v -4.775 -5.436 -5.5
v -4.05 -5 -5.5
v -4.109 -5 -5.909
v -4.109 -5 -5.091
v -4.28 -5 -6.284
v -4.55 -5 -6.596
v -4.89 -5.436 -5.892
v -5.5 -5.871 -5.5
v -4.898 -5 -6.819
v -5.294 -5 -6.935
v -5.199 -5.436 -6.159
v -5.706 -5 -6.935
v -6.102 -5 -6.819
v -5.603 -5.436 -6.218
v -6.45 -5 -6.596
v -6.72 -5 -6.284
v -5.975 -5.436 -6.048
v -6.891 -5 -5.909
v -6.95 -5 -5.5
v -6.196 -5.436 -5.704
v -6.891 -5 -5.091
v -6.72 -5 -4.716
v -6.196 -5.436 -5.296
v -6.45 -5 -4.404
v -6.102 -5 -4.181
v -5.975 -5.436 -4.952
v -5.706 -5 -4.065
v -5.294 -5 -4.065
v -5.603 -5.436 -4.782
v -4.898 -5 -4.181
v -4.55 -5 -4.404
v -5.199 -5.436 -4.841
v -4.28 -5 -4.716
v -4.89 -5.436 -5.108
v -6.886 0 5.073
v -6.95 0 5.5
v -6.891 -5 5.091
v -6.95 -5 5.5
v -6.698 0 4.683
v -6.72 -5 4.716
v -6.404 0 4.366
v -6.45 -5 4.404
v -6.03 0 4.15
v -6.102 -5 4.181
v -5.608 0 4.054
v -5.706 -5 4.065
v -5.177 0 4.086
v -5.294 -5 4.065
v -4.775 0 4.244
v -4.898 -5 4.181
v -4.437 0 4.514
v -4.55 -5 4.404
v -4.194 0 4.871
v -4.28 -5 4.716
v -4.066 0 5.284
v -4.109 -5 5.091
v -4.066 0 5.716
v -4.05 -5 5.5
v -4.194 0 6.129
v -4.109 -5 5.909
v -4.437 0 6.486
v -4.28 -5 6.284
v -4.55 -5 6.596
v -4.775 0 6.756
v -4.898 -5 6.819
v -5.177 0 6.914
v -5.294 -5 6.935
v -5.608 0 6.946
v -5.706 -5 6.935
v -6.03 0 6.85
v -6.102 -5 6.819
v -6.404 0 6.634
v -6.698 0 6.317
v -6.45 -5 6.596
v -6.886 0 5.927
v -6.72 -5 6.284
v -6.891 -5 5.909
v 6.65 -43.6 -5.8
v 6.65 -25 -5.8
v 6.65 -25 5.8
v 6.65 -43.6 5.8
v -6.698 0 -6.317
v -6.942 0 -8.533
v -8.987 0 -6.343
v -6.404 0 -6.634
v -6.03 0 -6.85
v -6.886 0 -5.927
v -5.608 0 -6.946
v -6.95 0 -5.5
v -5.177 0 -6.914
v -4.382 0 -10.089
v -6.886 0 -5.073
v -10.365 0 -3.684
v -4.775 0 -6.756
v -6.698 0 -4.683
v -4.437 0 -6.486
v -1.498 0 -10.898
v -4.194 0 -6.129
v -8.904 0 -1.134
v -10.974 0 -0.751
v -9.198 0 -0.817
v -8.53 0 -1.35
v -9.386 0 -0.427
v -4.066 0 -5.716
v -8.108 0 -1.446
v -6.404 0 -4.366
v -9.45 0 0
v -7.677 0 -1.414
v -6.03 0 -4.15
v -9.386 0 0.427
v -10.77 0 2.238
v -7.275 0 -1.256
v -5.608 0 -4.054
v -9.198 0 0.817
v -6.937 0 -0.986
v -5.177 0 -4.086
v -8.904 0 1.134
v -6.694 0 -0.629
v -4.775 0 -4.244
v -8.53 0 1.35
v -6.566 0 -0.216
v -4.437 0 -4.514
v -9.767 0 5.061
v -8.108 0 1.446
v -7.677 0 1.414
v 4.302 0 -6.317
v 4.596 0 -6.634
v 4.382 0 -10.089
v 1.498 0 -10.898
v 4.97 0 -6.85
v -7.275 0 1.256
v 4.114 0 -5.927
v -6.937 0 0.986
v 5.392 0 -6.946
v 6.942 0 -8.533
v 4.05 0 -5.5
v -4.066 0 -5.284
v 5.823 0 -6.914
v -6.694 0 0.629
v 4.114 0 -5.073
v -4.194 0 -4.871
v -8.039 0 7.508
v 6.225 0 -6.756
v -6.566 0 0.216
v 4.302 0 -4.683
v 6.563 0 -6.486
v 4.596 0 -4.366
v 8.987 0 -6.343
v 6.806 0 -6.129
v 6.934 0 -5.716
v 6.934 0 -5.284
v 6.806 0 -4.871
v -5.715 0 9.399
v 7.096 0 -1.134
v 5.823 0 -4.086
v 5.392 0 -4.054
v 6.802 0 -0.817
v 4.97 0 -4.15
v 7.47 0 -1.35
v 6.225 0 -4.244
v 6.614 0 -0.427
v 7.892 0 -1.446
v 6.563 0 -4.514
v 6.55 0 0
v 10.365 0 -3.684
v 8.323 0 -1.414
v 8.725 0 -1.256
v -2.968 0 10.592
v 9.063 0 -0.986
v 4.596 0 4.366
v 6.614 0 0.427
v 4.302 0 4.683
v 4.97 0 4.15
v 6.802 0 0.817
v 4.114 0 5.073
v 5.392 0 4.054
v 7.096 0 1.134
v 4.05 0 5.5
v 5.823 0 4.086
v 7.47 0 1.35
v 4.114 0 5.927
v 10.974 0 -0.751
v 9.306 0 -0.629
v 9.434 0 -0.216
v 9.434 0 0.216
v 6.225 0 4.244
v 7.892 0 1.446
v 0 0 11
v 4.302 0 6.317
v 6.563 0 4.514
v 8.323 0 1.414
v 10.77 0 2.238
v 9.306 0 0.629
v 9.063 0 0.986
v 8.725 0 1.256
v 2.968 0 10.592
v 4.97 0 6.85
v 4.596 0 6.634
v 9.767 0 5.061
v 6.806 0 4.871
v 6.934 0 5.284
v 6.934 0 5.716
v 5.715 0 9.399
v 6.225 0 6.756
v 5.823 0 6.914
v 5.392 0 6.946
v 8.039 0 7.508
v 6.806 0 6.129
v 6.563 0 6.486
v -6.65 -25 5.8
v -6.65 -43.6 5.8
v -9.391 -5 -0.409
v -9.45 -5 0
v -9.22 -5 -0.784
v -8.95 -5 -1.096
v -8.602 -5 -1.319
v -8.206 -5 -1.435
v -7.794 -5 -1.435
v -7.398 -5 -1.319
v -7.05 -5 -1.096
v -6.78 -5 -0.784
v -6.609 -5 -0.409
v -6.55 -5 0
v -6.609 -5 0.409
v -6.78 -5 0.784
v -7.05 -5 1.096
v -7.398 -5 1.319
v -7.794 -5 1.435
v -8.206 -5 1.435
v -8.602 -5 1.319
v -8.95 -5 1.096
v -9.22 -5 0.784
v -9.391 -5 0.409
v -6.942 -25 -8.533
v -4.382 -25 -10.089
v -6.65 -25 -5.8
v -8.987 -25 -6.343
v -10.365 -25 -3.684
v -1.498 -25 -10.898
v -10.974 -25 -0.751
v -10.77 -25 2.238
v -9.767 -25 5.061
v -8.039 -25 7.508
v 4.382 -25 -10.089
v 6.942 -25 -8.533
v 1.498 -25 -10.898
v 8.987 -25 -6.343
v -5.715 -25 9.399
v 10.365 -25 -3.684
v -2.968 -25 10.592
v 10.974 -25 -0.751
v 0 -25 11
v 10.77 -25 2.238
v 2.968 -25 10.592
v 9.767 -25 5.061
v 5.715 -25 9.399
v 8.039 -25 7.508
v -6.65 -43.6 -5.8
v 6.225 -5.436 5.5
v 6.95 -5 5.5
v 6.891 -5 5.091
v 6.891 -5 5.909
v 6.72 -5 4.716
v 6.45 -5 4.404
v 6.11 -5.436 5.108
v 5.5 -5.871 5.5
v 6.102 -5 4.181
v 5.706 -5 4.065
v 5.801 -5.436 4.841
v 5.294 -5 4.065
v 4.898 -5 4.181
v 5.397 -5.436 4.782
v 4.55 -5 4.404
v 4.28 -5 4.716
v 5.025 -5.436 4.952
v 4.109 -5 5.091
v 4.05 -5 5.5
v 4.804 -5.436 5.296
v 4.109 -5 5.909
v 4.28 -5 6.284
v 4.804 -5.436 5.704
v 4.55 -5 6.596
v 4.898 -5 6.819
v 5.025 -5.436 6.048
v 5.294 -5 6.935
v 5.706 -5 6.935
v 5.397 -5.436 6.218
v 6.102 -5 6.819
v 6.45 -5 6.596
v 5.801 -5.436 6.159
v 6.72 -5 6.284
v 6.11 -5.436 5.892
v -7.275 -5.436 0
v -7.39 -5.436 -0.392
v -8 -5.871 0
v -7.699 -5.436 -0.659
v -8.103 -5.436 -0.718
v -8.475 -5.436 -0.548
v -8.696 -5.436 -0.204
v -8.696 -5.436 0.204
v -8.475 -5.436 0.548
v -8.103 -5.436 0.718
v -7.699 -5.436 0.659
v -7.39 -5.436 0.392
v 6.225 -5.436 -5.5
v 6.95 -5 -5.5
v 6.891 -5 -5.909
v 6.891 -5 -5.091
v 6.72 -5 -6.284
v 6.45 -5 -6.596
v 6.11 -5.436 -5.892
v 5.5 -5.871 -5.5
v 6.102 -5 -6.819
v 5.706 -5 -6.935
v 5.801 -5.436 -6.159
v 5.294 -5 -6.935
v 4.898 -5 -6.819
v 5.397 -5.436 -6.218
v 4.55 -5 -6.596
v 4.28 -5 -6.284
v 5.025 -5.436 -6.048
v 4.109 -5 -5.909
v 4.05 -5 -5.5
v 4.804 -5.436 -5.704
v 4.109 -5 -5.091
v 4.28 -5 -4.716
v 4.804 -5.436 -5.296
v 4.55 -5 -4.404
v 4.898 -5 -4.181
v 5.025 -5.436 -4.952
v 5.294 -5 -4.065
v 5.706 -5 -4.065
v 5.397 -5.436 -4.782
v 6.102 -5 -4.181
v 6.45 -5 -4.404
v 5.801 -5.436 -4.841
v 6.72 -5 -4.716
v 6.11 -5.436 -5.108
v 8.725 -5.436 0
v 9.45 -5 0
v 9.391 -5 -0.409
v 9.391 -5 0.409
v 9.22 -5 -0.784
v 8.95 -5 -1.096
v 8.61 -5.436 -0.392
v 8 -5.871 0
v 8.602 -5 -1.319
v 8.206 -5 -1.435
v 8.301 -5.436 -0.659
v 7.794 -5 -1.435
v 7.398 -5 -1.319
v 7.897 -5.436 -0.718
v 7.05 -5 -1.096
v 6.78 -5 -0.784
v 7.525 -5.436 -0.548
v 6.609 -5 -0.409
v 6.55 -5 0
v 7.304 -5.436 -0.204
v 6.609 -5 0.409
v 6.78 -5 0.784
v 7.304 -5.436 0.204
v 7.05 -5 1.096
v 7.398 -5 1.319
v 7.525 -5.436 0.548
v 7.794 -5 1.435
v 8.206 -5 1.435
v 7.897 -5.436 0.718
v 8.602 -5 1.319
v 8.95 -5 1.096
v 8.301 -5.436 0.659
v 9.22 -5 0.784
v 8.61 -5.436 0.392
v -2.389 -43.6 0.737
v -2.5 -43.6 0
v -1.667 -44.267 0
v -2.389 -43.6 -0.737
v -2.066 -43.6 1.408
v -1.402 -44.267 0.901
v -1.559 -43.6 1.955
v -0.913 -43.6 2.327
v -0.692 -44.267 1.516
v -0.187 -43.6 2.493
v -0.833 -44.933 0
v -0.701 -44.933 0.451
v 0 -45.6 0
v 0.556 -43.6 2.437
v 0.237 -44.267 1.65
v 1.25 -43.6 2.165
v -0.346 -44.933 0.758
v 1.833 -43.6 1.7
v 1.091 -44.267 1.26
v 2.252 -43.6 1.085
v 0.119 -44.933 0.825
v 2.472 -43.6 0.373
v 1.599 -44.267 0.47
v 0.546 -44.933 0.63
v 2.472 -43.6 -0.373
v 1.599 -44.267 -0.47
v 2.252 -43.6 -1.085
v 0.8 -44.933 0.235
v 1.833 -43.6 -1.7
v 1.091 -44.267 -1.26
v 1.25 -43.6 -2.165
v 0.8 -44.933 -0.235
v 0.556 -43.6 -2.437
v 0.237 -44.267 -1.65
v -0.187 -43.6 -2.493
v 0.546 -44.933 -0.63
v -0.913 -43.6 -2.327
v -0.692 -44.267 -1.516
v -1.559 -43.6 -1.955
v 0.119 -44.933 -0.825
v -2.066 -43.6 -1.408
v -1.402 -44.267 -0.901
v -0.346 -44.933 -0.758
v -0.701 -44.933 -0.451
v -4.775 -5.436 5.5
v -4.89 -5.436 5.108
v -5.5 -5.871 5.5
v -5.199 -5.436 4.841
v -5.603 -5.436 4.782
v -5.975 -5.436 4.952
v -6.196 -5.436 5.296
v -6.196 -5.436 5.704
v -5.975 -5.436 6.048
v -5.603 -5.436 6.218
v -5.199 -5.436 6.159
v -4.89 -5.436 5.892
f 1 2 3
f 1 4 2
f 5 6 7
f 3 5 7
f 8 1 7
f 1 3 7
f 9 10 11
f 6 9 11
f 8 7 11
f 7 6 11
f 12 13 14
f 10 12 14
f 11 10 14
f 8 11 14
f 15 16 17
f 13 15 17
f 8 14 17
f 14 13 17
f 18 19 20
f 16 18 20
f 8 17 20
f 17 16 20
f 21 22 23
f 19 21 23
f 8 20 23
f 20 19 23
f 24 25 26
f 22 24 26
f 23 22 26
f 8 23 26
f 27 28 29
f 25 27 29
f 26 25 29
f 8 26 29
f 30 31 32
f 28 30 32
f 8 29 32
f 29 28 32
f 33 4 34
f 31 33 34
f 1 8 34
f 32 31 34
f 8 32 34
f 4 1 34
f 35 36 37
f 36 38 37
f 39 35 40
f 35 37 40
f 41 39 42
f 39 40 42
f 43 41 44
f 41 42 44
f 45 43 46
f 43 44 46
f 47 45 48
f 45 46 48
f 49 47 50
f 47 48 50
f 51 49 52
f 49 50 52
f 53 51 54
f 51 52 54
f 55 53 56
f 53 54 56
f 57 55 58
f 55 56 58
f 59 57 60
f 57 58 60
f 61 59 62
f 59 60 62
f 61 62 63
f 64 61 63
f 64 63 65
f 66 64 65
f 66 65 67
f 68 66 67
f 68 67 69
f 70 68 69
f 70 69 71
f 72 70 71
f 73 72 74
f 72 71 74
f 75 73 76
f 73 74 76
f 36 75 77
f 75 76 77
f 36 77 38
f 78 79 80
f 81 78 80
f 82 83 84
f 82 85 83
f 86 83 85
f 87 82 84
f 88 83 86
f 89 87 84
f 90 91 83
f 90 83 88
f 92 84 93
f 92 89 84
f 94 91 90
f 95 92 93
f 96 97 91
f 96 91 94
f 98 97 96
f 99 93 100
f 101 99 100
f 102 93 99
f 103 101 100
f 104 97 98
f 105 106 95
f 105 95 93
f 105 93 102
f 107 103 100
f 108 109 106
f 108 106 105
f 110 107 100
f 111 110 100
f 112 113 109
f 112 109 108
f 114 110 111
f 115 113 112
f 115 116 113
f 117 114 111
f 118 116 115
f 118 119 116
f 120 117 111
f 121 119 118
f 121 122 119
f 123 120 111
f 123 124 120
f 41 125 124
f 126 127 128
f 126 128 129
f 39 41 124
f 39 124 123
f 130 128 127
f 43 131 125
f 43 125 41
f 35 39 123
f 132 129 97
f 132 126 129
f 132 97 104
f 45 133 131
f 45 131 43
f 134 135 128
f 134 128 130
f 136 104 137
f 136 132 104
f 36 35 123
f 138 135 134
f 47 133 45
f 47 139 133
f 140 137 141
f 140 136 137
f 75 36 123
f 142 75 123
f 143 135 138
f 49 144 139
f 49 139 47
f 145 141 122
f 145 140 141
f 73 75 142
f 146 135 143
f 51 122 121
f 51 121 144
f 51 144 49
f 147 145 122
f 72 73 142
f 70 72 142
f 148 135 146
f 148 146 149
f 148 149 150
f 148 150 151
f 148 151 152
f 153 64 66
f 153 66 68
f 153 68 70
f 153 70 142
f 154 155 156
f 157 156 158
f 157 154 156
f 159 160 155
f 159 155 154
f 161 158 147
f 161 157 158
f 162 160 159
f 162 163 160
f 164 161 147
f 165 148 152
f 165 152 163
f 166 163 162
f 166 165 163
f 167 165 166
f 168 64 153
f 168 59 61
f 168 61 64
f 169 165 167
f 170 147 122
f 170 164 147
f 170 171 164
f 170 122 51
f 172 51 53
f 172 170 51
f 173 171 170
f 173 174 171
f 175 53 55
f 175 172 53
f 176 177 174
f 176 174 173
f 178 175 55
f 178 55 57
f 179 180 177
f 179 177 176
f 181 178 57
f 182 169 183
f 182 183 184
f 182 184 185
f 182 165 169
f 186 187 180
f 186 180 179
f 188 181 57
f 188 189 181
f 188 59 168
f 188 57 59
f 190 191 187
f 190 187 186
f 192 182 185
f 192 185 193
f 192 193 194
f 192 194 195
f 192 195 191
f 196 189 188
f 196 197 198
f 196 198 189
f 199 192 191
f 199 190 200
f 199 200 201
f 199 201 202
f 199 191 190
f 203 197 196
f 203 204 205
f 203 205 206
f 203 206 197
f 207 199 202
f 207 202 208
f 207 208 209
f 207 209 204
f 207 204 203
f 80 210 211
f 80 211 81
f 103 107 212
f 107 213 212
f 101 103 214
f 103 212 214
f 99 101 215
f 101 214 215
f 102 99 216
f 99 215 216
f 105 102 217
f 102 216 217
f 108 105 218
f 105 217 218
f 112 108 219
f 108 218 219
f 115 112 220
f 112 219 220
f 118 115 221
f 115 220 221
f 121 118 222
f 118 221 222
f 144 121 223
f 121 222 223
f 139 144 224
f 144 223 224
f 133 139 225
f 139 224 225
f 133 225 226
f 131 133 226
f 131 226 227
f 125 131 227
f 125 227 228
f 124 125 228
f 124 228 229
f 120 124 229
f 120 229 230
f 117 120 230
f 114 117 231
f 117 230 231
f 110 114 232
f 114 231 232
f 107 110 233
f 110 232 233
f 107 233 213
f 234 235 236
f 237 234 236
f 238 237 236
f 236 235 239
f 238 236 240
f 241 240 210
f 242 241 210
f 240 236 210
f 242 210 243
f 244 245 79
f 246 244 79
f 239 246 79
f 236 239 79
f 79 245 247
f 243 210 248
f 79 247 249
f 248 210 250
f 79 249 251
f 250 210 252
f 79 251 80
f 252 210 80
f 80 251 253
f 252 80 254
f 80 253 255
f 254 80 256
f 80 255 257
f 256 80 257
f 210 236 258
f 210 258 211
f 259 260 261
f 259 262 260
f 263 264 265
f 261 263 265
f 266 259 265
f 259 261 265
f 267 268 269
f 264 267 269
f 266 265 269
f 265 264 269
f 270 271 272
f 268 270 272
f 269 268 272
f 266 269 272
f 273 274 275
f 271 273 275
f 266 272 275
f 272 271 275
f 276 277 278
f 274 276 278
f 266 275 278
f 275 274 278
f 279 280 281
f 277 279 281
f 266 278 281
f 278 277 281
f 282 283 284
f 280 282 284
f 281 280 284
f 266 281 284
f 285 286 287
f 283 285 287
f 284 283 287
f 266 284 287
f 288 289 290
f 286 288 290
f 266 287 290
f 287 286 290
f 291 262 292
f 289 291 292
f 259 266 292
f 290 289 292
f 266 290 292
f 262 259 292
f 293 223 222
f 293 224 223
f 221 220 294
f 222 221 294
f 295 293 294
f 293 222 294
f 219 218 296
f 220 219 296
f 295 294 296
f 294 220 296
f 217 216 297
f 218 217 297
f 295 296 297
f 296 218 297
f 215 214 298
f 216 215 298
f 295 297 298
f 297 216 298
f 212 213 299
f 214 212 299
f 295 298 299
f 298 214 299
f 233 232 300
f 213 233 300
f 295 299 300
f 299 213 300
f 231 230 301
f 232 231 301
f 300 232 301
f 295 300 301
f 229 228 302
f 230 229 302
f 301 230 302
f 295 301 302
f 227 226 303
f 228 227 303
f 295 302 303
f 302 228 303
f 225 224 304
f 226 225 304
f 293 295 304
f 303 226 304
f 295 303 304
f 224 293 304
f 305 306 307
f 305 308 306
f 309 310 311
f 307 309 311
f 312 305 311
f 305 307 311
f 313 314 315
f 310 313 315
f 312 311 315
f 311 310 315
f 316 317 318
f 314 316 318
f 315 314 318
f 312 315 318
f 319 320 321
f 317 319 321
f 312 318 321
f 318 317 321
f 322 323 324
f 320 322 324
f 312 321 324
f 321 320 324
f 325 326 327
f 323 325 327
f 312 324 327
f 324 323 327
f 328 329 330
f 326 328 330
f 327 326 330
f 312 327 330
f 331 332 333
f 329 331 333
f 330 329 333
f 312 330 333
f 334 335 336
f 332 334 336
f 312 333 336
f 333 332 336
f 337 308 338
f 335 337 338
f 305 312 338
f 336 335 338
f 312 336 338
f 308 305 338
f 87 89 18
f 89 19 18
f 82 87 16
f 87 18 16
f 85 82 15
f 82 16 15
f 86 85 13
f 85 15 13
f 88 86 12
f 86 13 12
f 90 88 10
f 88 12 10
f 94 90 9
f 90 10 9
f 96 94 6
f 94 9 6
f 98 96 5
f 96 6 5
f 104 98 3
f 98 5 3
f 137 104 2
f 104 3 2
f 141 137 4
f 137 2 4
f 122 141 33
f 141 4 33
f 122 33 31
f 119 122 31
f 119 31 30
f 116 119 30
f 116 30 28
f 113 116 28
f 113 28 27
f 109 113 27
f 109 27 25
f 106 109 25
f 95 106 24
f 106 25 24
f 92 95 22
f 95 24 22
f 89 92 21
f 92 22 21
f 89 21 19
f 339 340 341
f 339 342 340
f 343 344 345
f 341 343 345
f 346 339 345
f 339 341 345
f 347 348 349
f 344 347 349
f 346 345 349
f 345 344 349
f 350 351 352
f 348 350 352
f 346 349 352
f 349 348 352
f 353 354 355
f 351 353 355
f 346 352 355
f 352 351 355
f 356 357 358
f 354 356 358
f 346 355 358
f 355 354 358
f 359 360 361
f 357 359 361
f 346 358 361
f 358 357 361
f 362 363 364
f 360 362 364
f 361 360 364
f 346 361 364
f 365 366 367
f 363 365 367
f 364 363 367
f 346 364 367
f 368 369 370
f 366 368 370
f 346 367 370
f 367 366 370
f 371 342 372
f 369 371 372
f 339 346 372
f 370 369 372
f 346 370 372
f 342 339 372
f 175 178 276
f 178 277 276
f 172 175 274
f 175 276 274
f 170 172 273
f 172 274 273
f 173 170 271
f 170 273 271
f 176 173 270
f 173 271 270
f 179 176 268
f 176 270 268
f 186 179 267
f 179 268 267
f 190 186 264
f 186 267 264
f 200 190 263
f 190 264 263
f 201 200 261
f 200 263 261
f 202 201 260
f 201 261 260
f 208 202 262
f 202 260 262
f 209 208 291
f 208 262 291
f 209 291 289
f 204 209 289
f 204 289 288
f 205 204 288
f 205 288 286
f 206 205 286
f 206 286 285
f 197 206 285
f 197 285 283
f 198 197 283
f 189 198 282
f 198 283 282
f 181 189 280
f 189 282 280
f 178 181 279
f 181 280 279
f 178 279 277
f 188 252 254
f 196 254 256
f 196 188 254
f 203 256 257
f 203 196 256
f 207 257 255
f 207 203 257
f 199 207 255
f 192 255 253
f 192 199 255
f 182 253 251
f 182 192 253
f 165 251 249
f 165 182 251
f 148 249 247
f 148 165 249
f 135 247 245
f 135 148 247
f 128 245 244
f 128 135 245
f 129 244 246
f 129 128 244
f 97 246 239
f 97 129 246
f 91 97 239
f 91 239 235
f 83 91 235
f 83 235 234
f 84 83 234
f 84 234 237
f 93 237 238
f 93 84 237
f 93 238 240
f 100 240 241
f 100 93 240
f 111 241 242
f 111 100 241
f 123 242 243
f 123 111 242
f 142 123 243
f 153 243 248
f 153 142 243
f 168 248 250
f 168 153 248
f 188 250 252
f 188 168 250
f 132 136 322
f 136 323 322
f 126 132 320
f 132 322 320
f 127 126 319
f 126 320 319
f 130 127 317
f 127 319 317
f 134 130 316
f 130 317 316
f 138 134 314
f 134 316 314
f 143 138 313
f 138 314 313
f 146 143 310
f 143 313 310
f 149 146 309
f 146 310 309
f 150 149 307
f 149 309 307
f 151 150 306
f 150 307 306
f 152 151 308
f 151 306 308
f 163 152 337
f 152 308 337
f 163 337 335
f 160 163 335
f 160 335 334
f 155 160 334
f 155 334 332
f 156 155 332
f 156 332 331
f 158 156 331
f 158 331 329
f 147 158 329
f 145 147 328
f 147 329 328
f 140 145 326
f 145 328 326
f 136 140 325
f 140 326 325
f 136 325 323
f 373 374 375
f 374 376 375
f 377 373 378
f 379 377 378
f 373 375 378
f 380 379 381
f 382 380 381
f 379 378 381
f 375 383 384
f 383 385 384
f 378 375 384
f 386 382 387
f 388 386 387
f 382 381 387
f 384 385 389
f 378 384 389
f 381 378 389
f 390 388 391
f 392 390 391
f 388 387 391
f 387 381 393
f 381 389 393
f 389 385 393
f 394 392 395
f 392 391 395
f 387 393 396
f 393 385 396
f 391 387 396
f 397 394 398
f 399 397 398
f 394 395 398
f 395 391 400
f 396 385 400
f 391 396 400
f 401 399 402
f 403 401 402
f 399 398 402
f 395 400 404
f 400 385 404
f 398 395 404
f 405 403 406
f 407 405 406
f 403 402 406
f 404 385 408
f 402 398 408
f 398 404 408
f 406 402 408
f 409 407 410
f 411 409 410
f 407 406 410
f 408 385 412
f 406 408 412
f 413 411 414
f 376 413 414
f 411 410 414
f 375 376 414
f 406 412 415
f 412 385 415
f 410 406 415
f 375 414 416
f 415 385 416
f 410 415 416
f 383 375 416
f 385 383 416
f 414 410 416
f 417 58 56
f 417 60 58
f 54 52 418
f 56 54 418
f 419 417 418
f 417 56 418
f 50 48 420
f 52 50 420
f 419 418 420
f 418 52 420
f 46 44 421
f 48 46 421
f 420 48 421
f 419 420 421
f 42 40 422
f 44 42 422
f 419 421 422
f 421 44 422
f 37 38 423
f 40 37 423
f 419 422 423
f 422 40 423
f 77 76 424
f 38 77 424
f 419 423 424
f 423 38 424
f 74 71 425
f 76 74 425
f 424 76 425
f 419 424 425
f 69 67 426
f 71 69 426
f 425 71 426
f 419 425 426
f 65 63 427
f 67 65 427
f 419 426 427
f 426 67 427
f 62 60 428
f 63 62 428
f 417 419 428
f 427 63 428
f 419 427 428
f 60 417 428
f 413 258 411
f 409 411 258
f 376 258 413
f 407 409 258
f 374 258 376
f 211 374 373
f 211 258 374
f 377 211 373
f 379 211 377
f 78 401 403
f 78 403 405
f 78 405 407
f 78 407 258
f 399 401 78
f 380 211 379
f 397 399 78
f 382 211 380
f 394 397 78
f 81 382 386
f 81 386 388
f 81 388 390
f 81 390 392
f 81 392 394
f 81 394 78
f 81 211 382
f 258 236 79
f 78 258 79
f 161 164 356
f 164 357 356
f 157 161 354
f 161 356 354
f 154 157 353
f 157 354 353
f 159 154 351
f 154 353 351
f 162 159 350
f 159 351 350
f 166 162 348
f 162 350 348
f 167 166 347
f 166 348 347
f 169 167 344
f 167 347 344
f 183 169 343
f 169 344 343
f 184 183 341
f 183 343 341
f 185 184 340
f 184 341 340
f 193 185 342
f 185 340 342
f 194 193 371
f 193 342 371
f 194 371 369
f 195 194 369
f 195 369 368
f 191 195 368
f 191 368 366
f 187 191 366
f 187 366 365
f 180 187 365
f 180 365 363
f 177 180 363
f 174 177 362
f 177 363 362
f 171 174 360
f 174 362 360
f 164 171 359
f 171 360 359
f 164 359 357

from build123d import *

# Parameters (mm, degrees)
SKETCH2_R                  = 11
BOSS_EXTRUDE1_DEPTH        = 25
SKETCH3_W                  = 13.3
SKETCH3_H                  = 11.6
BOSS_EXTRUDE2_DEPTH        = 18.6
M2_5_CLEARANCE_HOLE1_D     = 2.9
M2_5_CLEARANCE_HOLE1_DEPTH = 5
M2_5_CLEARANCE_HOLE1_TIP   = 0.871247898


with BuildPart() as part:
    # Sketch2 → Boss-Extrude1 (new body)
    with BuildSketch(Plane(origin=(0, 0, 0), x_dir=(1, 0, 0), z_dir=(0, 1, 0))):
        with Locations(Location((0, 0, 0), (0, 0, 270))):
            Circle(SKETCH2_R)
    extrude(amount=-BOSS_EXTRUDE1_DEPTH)

    # Sketch3 → Boss-Extrude2 (add)
    with BuildSketch(Plane.XZ.offset(25)):
        Rectangle(SKETCH3_W, SKETCH3_H)
    extrude(amount=BOSS_EXTRUDE2_DEPTH)

    # Sketch4 → Revolve1 (revolve)
    with BuildSketch(Plane.XY):
        Polygon((-2.5, -43.6), (0, -45.6), (0, -43.6), align=None)
    revolve(axis=Axis((0, -45.6, 0), (0, 1, 0)))

    # M2.5 Clearance Hole1
    with Locations(Plane(origin=(0, 0, 0), x_dir=(1, 0, 0), z_dir=(0, 1, 0))):
        with Locations((-5.5, 5.5), (5.5, -5.5), (-5.5, -5.5), (5.5, 5.5), (8, 0), (-8, 0)):
            Hole(M2_5_CLEARANCE_HOLE1_D / 2, depth=M2_5_CLEARANCE_HOLE1_DEPTH)
            with Locations((0, 0, -(M2_5_CLEARANCE_HOLE1_DEPTH + M2_5_CLEARANCE_HOLE1_TIP / 2))):  # 118° drill point
                Cone(0, M2_5_CLEARANCE_HOLE1_D / 2, M2_5_CLEARANCE_HOLE1_TIP, mode=Mode.SUBTRACT)


solid = part.part
